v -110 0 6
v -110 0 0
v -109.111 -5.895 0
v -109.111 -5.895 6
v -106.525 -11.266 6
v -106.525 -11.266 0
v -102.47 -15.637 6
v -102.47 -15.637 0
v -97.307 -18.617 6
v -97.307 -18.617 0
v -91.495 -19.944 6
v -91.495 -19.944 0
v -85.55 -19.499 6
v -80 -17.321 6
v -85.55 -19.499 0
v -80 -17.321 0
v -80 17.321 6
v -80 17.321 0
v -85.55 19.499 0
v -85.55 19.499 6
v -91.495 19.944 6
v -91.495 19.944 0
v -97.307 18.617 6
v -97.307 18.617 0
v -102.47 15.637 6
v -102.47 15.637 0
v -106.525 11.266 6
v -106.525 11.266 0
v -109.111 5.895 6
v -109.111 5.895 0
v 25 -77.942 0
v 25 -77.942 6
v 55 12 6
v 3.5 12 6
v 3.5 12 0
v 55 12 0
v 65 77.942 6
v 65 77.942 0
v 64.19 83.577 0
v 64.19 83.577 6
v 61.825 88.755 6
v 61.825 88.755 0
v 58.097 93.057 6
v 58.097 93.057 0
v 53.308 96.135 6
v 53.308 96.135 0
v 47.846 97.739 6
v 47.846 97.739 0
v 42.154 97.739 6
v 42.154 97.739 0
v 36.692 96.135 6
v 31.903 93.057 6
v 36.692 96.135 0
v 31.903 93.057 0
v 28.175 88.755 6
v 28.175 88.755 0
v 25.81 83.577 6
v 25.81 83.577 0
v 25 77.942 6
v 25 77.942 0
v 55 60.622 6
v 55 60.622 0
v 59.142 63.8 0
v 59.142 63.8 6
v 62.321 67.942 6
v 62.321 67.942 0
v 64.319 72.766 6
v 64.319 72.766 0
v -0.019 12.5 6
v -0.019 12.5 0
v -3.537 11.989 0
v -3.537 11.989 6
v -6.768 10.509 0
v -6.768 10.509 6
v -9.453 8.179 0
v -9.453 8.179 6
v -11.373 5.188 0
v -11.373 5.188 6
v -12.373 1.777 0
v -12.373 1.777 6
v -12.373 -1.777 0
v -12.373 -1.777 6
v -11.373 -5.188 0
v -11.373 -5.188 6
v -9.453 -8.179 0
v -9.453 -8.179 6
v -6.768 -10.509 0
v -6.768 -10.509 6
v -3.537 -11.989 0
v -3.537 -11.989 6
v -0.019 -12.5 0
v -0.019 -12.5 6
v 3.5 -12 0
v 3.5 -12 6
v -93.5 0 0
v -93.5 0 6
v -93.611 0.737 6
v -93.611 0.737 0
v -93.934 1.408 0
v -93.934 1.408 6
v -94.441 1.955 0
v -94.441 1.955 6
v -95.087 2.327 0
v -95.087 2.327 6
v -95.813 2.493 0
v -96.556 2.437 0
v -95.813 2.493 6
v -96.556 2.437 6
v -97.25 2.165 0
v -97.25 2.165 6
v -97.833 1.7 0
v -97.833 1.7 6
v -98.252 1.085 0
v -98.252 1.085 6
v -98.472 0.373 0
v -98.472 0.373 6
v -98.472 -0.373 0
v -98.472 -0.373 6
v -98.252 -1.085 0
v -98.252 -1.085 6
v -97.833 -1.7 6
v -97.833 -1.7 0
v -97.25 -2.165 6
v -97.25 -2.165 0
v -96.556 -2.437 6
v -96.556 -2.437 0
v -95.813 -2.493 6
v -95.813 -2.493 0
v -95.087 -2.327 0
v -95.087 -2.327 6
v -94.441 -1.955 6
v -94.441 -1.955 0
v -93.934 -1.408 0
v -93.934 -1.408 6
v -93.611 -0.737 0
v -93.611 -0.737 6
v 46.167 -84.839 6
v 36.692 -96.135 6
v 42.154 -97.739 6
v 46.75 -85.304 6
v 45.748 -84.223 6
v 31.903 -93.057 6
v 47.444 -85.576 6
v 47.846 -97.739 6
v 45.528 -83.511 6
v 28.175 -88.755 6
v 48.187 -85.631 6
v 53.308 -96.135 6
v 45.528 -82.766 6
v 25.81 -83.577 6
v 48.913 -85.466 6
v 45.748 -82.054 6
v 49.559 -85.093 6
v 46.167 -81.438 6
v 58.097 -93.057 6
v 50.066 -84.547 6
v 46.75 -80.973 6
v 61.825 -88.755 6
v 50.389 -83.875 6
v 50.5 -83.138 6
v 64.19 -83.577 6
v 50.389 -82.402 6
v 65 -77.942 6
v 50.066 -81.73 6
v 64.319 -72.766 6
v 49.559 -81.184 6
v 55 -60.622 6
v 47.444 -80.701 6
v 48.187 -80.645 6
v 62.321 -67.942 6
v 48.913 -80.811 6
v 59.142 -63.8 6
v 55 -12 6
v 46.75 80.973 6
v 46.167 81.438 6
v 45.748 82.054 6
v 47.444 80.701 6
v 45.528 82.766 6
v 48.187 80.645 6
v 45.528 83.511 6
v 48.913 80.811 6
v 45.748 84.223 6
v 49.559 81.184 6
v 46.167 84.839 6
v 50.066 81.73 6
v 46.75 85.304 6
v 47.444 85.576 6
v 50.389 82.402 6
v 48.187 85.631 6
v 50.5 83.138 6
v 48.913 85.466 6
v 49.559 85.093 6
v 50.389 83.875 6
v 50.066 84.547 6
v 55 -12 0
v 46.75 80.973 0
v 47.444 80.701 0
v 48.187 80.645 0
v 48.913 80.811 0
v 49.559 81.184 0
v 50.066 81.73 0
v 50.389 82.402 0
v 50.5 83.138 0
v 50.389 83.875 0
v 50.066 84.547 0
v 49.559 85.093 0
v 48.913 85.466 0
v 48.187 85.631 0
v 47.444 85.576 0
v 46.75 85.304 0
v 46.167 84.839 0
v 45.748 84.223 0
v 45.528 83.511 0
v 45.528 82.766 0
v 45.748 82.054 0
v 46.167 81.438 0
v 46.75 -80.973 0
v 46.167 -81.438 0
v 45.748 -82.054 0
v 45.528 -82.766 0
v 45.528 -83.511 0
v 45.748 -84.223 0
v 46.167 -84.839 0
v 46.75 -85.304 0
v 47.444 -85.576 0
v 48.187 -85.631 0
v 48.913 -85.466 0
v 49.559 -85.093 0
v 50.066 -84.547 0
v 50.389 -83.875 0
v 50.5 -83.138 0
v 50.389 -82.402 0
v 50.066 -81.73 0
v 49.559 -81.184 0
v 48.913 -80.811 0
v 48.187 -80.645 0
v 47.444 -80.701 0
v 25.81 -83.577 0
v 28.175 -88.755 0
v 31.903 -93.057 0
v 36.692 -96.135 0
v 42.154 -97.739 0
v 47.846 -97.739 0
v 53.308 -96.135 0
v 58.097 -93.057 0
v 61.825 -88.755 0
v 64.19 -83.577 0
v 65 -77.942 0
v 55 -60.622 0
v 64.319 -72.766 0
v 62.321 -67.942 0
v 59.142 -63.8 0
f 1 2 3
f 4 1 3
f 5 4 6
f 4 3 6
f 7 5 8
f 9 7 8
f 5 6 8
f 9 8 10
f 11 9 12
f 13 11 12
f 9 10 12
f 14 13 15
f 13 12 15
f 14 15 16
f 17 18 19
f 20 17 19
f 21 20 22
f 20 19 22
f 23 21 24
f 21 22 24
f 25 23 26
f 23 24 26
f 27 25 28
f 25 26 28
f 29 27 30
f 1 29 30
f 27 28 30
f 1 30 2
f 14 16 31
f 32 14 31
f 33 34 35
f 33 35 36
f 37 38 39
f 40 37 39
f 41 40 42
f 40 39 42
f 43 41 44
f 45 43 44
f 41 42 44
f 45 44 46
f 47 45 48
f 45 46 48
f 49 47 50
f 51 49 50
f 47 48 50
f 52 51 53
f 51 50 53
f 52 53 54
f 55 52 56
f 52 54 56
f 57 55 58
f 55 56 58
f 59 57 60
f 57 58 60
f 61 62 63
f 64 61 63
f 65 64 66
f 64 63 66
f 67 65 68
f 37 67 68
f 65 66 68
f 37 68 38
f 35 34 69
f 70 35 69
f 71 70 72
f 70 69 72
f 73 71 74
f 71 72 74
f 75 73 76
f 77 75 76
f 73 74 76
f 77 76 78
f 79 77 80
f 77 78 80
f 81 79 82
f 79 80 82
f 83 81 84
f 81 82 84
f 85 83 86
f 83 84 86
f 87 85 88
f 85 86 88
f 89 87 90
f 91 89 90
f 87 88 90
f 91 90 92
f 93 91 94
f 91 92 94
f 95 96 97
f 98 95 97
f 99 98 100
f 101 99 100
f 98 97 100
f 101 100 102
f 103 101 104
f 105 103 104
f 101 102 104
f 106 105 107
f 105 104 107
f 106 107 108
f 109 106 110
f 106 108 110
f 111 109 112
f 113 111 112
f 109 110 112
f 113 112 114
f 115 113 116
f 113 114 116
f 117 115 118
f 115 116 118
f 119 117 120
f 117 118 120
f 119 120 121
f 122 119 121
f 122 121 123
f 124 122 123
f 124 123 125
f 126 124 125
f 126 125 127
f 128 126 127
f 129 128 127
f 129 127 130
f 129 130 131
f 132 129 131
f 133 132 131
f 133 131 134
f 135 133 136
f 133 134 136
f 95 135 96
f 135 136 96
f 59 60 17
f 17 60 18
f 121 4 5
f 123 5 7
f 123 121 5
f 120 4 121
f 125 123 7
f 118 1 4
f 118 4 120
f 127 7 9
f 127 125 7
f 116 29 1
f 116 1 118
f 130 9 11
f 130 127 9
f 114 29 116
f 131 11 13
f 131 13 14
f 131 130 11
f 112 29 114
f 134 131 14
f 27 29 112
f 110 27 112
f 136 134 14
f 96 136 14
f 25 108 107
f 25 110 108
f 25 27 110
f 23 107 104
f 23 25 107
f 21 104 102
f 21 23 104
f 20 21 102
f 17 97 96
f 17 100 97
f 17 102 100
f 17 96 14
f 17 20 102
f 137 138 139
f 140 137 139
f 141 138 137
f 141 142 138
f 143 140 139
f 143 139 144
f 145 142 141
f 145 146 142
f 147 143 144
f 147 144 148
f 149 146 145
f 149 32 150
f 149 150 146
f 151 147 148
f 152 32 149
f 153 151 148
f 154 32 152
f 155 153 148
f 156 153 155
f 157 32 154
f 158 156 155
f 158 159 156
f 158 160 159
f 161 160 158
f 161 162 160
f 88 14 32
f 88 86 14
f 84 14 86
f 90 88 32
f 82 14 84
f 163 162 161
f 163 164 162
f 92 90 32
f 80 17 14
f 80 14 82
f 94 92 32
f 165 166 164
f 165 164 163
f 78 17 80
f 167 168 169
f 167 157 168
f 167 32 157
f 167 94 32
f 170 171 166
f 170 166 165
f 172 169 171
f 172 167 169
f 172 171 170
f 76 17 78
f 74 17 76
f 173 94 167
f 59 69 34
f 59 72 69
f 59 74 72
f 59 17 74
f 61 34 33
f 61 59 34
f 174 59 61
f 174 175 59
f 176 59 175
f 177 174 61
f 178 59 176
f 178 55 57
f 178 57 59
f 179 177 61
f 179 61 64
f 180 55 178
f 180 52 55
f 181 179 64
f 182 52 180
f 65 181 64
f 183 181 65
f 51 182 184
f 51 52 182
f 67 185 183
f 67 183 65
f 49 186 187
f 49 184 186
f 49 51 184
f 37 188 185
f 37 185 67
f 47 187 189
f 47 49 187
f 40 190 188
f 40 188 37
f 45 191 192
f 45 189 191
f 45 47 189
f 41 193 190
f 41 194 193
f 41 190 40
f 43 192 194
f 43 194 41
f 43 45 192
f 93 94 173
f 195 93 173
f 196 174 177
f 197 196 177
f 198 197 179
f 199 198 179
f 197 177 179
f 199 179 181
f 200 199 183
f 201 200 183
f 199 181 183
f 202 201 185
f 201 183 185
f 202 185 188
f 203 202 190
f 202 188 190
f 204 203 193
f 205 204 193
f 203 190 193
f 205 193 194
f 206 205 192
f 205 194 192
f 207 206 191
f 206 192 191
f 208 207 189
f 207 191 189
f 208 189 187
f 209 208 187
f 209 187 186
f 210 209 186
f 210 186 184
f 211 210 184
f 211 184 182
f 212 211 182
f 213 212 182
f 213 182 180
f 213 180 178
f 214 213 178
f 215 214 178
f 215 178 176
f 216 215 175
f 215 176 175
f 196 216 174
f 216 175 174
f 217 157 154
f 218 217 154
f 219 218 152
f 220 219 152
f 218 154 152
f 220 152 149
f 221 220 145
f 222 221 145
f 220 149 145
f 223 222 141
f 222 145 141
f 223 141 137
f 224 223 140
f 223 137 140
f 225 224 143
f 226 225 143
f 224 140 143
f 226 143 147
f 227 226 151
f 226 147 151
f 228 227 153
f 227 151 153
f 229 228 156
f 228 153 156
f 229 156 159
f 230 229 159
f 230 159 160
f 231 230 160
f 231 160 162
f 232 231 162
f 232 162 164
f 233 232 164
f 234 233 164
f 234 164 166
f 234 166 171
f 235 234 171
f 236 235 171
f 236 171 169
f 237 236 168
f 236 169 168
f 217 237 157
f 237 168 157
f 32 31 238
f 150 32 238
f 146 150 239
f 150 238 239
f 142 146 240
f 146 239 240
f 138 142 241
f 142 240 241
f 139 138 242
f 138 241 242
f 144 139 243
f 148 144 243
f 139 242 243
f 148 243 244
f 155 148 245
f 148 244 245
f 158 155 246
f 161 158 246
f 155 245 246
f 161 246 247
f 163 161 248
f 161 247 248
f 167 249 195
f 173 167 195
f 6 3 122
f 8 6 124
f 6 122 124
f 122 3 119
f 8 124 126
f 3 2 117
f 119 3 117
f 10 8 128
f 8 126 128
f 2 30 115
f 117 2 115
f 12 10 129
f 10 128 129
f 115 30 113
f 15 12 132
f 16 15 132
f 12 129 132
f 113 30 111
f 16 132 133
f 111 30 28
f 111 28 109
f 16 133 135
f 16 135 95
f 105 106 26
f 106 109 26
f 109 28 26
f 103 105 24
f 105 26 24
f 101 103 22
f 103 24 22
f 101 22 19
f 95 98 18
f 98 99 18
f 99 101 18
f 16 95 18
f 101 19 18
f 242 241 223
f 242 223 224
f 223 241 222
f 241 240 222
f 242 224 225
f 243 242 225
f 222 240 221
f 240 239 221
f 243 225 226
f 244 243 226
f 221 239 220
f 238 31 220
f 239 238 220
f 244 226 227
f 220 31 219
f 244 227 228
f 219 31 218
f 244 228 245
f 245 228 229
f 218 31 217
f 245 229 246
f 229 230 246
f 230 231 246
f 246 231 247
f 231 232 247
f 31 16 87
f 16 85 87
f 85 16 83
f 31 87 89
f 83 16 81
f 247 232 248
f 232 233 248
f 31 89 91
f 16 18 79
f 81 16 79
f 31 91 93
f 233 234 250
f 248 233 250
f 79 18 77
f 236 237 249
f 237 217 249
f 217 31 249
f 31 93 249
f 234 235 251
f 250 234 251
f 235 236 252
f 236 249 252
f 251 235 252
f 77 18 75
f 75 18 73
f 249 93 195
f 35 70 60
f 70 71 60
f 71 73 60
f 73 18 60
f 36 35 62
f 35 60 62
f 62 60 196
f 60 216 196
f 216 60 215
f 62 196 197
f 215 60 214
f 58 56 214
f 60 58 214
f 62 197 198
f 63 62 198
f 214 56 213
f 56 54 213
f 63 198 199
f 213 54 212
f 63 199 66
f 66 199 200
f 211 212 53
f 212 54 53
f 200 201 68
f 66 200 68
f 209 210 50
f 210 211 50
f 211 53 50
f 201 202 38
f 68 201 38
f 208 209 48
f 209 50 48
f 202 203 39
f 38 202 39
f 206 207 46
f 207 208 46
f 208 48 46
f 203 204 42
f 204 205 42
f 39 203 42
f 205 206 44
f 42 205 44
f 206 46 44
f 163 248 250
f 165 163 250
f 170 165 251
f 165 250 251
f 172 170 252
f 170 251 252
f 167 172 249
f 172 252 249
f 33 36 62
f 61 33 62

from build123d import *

# Parameters (mm, degrees)
F1_DEPTH        = 6
F2_R            = 12.5
F3_DEPTH        = 6
F4_R            = 2.5
F5_DEPTH        = 6
F5_COPIES_COUNT = 3
F6_W            = 60
F6_H            = 24
F7_DEPTH        = 6


# Not quite as in the source:
# - a pattern or mirror of a feature is missing from the dataset's text; its kind, count and spacing are read off the source's solid


with BuildPart() as f1:
    # F0 (on Top) → F1 (new body)
    with BuildSketch(Plane.XY):
        with BuildLine():
            ThreePointArc((-80, 17.3205080757), (-100, 17.3205080757), (-110, 0))
            Line((-110, 0), (-80, 17.3205080757))
        make_face()
        with BuildLine():
            Line((-80, 17.3205080757), (-110, 0))
            Line((-110, 0), (-80, -17.3205080757))
            ThreePointArc((-80, -17.3205080757), (-72.6794919243, -10), (-70, 0))
            ThreePointArc((-70, 0), (-72.6794919243, 10), (-80, 17.3205080757))
        make_face()
        with BuildLine():
            Line((-80, -17.3205080757), (-110, 0))
            ThreePointArc((-110, 0), (-100, -17.3205080757), (-80, -17.3205080757))
        make_face()
        with BuildLine():
            Line((25, 77.9422863406), (-80, 17.3205080757))
            ThreePointArc((-80, 17.3205080757), (-72.6794919243, 10), (-70, 0))
            ThreePointArc((-70, 0), (-72.6794919243, -10), (-80, -17.3205080757))
            Line((-80, -17.3205080757), (25, -77.9422863406))
            ThreePointArc((25, -77.9422863406), (35, -60.6217782649), (55, -60.6217782649))
            Line((55, -60.6217782649), (55, 60.6217782649))
            ThreePointArc((55, 60.6217782649), (35, 60.6217782649), (25, 77.9422863406))
        make_face()
        with BuildLine():
            ThreePointArc((55, 95.2627944163), (35, 95.2627944163), (25, 77.9422863406))
            Line((25, 77.9422863406), (55, 95.2627944163))
        make_face()
        with BuildLine():
            Line((55, 95.2627944163), (25, 77.9422863406))
            ThreePointArc((25, 77.9422863406), (35, 60.6217782649), (55, 60.6217782649))
            Line((55, 60.6217782649), (55, 95.2627944163))
        make_face()
        with BuildLine():
            ThreePointArc((55, -60.6217782649), (35, -60.6217782649), (25, -77.9422863406))
            Line((25, -77.9422863406), (55, -95.2627944163))
            Line((55, -95.2627944163), (55, -60.6217782649))
        make_face()
        with BuildLine():
            Line((55, -95.2627944163), (25, -77.9422863406))
            ThreePointArc((25, -77.9422863406), (35, -95.2627944163), (55, -95.2627944163))
        make_face()
        with BuildLine():
            ThreePointArc((65, 77.9422863406), (62.3205080757, 87.9422863406), (55, 95.2627944163))
            Line((55, 95.2627944163), (55, 60.6217782649))
            ThreePointArc((55, 60.6217782649), (62.3205080757, 67.9422863406), (65, 77.9422863406))
        make_face()
        with BuildLine():
            Line((55, -60.6217782649), (55, -95.2627944163))
            ThreePointArc((55, -95.2627944163), (62.3205080757, -87.9422863406), (65, -77.9422863406))
            ThreePointArc((65, -77.9422863406), (62.3205080757, -67.9422863406), (55, -60.6217782649))
        make_face()
    extrude(amount=F1_DEPTH)

    # F2 (on face) → F3 (cut, through all)
    with BuildSketch(Plane.XY.offset(6)):
        Circle(F2_R)
    extrude(amount=-F3_DEPTH, mode=Mode.SUBTRACT)

    # F4 (on face) → F5 (cut, through all)
    with BuildSketch(Plane.XY.offset(6)):
        with Locations((-96, 0)):
            Circle(F4_R)
    f5 = extrude(amount=-F5_DEPTH, mode=Mode.SUBTRACT)

    # F5_copies: F5 ×3 about axis
    f5_copies_axis = Axis((0, 0, 0), (0, 0, 1))
    for i in range(1, F5_COPIES_COUNT):
        add(f5.rotate(f5_copies_axis, i * 360 / F5_COPIES_COUNT), mode=Mode.SUBTRACT)

    # F6 (on face) → F7 (cut, through all)
    with BuildSketch(Plane.XY.offset(6)):
        with Locations((33.5, 0)):
            Rectangle(F6_W, F6_H)
    extrude(amount=-F7_DEPTH, mode=Mode.SUBTRACT)


solid = f1.part
